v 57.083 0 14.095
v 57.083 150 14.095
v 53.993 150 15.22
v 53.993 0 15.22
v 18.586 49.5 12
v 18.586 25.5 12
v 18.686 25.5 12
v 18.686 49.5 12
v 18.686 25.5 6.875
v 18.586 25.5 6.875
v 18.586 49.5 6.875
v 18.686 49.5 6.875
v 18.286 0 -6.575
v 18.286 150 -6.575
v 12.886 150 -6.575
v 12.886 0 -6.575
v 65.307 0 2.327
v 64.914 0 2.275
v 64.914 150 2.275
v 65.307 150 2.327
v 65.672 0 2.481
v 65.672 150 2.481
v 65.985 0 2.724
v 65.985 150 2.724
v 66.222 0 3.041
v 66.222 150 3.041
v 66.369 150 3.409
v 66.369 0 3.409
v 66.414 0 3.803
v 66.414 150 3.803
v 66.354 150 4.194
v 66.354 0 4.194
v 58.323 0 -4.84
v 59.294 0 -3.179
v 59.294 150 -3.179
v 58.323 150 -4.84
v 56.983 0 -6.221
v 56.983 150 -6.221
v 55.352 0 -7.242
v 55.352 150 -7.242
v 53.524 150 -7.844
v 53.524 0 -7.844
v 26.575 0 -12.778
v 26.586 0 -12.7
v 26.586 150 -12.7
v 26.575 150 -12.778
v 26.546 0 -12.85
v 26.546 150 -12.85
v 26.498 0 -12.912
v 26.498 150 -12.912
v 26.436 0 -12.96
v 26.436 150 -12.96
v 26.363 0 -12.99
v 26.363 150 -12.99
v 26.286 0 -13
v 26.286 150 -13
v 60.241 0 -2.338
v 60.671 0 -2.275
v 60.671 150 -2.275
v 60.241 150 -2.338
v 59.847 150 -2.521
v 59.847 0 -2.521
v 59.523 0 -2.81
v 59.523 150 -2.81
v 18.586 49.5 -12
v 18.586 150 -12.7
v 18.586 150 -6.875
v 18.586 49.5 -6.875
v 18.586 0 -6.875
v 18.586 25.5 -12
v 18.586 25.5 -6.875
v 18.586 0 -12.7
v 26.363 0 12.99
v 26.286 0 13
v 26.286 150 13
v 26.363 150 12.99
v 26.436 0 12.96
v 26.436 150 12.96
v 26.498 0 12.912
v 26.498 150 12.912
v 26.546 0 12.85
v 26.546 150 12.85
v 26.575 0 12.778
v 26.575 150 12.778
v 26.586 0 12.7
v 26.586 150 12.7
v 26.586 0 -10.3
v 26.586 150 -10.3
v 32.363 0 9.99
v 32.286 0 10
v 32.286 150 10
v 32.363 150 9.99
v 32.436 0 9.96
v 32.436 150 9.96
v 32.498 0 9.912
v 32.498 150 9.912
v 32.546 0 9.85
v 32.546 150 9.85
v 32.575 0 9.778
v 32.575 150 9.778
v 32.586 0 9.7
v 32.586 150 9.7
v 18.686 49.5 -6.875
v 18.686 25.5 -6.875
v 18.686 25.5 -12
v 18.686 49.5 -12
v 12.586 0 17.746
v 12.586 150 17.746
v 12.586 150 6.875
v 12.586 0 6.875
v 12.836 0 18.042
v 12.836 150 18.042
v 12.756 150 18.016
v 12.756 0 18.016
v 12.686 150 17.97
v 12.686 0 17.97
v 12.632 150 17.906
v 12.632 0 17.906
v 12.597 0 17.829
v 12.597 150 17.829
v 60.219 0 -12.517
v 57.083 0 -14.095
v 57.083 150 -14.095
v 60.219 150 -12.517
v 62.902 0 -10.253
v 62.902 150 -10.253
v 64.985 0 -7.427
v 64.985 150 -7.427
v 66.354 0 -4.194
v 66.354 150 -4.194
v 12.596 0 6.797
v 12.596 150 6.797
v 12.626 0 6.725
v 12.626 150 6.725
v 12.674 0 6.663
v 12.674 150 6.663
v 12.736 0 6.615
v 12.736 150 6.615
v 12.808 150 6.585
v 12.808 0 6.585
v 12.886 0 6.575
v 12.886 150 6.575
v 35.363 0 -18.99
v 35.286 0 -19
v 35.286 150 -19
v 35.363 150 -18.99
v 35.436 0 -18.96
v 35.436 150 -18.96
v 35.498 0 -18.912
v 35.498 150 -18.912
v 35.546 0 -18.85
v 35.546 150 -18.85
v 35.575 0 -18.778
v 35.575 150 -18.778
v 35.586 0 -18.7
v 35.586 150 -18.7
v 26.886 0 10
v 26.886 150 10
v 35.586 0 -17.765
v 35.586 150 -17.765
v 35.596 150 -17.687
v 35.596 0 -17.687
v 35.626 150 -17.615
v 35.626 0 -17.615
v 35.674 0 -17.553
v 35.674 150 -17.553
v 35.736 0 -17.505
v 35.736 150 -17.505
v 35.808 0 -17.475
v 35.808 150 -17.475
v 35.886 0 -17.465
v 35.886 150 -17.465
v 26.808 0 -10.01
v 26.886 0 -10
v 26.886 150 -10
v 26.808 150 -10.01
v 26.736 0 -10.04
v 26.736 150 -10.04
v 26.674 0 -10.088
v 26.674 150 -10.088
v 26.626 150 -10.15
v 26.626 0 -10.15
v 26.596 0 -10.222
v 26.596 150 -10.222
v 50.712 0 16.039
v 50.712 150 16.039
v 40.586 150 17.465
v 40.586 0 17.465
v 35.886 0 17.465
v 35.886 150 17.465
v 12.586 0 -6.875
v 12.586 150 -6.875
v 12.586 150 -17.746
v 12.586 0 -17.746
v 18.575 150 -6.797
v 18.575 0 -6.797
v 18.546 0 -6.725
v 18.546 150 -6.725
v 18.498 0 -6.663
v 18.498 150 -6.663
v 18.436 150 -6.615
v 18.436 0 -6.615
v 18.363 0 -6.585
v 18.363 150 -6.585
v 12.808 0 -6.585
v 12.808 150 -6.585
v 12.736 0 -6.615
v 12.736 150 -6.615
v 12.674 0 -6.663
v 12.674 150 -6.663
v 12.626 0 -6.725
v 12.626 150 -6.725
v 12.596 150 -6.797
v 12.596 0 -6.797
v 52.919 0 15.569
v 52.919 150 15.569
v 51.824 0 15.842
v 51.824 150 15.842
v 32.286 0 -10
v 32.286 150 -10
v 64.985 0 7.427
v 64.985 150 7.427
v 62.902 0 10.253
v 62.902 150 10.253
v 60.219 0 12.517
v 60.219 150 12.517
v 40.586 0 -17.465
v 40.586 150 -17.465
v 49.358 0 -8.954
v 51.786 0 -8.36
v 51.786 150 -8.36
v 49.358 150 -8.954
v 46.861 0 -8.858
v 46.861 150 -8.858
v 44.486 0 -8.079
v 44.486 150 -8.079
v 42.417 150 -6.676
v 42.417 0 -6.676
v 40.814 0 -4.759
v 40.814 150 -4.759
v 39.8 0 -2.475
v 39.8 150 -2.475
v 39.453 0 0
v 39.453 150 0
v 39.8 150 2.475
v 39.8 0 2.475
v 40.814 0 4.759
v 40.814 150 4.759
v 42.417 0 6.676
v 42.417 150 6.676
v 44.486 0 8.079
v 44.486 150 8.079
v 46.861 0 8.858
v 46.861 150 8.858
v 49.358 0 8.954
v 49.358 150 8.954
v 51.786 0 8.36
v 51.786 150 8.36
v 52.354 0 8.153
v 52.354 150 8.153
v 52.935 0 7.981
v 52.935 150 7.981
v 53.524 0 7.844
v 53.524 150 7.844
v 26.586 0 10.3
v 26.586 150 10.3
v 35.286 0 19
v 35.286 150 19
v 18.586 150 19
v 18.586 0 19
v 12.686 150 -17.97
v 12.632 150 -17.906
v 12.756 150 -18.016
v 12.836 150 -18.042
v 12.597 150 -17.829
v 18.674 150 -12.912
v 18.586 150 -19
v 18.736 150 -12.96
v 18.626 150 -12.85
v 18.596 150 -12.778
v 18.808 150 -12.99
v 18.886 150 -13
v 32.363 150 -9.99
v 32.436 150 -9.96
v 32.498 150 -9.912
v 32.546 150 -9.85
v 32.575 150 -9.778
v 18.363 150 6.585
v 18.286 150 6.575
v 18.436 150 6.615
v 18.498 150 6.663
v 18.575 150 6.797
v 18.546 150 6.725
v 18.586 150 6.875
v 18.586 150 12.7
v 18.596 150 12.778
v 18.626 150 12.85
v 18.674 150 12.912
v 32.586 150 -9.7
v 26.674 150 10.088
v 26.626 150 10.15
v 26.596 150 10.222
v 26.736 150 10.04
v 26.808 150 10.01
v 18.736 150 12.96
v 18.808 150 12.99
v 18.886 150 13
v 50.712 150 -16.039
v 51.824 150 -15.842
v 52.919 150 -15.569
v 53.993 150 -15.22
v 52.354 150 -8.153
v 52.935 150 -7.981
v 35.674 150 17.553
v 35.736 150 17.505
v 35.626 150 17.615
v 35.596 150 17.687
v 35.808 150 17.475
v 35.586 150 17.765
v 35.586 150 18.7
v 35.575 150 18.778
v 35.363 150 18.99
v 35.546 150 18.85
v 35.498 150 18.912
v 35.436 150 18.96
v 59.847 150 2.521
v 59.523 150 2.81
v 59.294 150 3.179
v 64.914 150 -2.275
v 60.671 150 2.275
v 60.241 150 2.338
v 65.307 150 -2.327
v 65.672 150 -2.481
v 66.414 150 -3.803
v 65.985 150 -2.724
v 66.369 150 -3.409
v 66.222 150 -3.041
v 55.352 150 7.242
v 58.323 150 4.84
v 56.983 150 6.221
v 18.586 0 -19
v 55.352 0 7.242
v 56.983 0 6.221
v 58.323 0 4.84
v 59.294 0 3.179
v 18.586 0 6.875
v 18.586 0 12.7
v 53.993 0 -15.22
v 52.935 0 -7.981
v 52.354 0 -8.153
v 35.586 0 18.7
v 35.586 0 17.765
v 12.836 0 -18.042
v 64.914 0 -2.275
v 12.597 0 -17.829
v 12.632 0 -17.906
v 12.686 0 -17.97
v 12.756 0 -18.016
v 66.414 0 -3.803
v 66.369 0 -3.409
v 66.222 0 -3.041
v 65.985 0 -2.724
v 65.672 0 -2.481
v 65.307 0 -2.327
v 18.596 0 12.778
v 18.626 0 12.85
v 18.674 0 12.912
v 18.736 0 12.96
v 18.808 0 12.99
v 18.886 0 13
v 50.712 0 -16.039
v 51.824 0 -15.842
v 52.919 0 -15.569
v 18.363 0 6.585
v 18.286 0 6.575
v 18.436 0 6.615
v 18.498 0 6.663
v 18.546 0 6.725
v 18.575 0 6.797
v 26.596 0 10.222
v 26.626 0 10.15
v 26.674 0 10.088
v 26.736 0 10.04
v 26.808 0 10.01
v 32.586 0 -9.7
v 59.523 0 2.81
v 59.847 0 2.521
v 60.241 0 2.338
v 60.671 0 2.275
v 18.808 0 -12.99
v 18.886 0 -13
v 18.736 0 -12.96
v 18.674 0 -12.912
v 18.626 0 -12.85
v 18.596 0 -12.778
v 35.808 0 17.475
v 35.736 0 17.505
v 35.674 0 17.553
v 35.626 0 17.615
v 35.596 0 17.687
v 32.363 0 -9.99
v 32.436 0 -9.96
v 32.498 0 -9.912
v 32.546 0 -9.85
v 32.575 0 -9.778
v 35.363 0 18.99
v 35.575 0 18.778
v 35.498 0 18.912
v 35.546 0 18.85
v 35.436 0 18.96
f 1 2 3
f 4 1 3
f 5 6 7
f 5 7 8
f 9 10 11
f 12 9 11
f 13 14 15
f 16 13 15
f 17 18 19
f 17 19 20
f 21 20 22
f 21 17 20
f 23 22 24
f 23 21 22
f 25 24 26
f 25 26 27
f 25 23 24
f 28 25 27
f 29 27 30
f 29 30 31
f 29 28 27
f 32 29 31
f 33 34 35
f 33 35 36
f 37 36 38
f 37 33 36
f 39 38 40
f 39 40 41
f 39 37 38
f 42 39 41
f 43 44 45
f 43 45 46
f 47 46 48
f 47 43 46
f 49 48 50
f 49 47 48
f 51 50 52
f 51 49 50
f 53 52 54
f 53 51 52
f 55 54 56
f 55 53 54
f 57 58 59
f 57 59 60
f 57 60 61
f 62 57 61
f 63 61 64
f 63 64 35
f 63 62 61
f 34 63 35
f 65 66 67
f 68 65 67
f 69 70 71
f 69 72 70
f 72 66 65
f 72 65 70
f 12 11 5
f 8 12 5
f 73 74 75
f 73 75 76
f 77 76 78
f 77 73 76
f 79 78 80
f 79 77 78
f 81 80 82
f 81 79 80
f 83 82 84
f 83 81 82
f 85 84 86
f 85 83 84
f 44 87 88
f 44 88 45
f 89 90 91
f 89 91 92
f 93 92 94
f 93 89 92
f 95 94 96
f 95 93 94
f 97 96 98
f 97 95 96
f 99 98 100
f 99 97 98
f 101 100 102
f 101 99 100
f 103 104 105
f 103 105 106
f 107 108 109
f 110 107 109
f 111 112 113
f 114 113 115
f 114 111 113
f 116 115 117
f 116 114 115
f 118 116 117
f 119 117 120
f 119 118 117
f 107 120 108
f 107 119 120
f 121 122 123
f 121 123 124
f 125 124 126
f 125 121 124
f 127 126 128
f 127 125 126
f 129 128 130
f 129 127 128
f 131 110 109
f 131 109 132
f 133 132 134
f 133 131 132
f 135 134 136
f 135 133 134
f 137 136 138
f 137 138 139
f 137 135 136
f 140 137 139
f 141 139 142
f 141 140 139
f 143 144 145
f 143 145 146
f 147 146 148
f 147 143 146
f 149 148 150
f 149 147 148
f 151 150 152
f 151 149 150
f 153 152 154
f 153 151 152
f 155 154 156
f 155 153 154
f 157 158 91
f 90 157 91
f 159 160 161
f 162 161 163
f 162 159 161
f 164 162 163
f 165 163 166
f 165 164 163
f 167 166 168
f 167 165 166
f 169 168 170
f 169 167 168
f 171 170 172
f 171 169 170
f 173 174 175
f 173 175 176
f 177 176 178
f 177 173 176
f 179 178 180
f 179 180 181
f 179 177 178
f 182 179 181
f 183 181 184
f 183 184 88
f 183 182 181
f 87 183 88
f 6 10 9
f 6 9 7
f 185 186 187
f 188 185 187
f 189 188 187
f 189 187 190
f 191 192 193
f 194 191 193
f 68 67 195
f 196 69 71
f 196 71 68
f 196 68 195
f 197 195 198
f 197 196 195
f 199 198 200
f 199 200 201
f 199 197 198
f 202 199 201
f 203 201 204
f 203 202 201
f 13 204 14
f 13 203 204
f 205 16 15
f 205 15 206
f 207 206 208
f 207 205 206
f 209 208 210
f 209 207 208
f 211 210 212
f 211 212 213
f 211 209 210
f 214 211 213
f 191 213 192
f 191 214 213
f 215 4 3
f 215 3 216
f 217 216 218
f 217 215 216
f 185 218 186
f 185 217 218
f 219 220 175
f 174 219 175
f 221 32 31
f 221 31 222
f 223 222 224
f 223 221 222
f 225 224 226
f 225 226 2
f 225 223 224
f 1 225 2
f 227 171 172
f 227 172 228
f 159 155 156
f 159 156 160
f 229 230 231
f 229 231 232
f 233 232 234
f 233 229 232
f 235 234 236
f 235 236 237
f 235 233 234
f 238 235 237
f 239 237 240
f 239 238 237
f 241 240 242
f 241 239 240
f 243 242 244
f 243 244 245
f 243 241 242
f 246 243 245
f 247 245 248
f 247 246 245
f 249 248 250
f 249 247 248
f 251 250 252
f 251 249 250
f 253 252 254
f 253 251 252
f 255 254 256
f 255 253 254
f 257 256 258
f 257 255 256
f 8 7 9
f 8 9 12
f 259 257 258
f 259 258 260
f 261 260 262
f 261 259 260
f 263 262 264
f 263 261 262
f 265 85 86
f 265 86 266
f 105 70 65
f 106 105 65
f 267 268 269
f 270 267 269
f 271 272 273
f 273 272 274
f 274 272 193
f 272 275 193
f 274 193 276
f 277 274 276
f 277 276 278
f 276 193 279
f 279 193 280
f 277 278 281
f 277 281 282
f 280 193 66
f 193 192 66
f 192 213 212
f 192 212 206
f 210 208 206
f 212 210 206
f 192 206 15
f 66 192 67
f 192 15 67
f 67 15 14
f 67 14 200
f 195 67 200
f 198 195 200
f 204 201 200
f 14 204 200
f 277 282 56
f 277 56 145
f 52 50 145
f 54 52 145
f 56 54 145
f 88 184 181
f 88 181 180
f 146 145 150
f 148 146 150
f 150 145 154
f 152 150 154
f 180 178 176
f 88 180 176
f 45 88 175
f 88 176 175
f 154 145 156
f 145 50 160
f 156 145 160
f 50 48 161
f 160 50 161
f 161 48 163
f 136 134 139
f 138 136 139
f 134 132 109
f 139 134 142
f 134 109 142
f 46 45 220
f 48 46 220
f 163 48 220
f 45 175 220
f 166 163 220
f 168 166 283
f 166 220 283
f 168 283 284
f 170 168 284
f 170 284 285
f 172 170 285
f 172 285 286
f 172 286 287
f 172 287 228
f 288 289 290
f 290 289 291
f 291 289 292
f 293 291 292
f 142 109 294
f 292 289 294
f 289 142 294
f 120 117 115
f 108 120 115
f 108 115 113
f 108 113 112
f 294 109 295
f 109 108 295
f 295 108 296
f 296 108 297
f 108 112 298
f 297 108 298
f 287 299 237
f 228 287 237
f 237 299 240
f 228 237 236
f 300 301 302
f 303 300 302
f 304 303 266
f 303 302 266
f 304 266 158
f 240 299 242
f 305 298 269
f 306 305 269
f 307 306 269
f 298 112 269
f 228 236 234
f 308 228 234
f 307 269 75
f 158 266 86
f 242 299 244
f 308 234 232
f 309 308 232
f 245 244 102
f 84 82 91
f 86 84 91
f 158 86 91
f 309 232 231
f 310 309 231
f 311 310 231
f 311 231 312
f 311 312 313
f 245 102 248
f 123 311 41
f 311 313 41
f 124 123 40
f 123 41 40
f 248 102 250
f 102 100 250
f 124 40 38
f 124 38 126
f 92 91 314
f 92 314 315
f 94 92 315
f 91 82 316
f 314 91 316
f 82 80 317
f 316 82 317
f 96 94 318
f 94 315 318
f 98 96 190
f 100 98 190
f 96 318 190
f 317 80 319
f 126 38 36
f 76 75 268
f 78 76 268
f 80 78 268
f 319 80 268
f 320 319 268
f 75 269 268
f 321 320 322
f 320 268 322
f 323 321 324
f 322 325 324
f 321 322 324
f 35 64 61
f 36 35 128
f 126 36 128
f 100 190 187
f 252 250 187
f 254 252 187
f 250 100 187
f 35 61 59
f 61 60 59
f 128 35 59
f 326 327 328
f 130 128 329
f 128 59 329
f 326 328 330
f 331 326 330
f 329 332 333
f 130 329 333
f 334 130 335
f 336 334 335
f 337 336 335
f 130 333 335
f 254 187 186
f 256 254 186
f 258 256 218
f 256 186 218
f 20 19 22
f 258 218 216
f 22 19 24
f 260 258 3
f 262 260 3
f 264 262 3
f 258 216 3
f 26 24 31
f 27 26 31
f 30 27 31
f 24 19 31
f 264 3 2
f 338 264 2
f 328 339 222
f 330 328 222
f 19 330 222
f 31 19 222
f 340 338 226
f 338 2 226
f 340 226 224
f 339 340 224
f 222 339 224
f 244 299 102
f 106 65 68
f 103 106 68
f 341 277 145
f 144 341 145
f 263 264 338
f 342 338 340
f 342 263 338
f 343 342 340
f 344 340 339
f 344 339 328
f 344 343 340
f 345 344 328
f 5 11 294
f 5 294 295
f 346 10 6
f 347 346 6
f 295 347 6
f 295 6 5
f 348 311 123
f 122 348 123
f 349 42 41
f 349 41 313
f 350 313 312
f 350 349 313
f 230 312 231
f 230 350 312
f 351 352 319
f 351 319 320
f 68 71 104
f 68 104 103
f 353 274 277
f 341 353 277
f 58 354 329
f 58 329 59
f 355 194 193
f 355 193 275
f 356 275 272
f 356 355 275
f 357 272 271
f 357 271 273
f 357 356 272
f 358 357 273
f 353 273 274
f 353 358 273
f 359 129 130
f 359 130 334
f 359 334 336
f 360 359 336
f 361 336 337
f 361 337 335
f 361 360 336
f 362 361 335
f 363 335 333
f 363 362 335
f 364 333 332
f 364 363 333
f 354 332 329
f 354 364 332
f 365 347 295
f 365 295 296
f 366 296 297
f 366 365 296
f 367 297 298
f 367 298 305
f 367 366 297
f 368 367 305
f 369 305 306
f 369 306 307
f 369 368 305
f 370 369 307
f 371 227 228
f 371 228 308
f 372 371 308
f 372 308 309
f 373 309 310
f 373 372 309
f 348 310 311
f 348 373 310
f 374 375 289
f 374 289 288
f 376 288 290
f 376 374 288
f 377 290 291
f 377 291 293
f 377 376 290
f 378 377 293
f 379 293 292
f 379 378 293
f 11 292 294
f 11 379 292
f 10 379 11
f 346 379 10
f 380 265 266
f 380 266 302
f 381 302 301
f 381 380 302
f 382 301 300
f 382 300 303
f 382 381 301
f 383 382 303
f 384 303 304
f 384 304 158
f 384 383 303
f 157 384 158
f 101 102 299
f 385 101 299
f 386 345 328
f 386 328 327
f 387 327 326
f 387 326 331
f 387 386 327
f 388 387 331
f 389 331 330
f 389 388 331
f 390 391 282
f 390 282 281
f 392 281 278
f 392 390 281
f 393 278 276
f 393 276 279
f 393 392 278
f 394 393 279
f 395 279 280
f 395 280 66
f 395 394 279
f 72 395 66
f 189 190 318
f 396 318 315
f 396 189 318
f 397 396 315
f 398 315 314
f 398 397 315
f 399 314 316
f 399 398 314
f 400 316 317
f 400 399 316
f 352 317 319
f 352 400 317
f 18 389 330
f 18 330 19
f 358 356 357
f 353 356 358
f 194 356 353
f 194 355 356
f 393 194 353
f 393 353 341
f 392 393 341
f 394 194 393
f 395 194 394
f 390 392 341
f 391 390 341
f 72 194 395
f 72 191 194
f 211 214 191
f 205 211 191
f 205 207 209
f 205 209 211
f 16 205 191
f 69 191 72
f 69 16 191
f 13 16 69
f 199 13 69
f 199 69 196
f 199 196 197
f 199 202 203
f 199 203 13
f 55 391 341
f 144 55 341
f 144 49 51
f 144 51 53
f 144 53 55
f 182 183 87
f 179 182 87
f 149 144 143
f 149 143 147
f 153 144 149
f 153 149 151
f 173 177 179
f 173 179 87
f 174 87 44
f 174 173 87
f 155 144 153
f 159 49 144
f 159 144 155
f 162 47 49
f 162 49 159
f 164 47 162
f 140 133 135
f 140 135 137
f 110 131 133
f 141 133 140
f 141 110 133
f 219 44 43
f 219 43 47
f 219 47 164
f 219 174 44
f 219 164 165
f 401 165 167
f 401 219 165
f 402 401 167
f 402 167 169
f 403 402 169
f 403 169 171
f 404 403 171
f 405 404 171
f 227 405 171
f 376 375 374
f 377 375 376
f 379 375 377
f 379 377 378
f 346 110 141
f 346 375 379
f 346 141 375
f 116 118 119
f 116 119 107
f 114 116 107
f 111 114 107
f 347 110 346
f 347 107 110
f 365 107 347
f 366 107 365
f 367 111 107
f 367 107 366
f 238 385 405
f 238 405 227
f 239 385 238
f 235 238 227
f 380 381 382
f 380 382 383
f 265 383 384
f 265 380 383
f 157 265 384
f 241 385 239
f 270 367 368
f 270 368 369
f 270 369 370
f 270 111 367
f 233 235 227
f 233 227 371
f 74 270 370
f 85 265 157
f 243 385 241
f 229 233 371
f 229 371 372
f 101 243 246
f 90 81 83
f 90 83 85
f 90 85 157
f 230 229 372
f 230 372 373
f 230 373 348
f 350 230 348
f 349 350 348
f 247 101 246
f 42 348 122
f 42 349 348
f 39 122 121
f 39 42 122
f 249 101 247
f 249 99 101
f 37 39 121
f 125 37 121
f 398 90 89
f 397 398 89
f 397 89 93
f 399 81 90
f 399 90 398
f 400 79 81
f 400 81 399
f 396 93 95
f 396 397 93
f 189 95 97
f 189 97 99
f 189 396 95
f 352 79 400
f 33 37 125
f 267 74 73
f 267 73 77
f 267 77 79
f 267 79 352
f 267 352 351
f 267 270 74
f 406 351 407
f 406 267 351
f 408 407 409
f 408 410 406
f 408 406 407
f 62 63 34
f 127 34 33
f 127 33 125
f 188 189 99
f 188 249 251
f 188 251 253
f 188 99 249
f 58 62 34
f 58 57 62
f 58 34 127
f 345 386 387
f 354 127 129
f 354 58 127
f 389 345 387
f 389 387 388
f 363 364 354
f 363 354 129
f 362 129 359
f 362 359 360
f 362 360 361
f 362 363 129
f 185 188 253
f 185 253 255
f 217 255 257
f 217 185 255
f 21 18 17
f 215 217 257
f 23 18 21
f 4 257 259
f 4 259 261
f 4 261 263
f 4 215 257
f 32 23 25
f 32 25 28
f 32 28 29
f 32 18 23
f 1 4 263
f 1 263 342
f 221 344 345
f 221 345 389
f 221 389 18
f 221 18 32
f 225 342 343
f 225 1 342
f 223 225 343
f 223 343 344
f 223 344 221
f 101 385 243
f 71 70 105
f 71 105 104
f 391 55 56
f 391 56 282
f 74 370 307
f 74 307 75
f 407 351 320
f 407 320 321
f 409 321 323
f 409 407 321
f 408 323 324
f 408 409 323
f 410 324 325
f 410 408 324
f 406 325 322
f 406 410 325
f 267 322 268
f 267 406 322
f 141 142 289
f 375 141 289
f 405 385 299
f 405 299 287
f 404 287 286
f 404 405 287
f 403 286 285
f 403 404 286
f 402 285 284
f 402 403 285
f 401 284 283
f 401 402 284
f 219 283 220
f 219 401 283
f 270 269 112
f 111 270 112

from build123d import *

# Parameters (mm, degrees)
F1_DEPTH = 150
F2_W     = 24
F2_H     = 5.125
F3_DEPTH = 0.1
F4_DEPTH = 0.1


# Not quite as in the source:
# - ends of sketch curves that miss each other by under 0.0002 mm in the source are joined


with BuildPart() as f1:
    # F0 (on Front) → F1 (new body)
    with BuildSketch(Plane.XZ):
        with BuildLine():
            Line((53.992555, -15.220268), (57.083133, -14.095389))
            ThreePointArc((57.083133, -14.095389), (62.9018568836, -10.252747544), (66.3544503107, -4.1944440905))
            ThreePointArc((66.3544503107, -4.1944440905), (66.1141142416, -2.8747683688), (64.914288, -2.275))
            Line((64.914288, -2.275), (60.670593, -2.275))
            ThreePointArc((60.670593, -2.275), (59.8472095147, -2.5211899521), (59.2941043505, -3.1789471518))
            ThreePointArc((59.2941043505, -3.1789471518), (56.9827494729, -6.2209259886), (53.52425904, -7.8441451998))
            ThreePointArc((53.52425904, -7.8441451998), (52.6431740995, -8.0626756758), (51.7855370008, -8.3602070021))
            ThreePointArc((51.7855370008, -8.3602070021), (39.452831, 0), (51.7855371982, 8.3602074972))
            ThreePointArc((51.7855371982, 8.3602074972), (52.6431743712, 8.0626765952), (53.524259133, 7.844145664))
            ThreePointArc((53.524259133, 7.844145664), (56.9827494729, 6.2209259886), (59.2941043849, 3.1789471667))
            ThreePointArc((59.2941043849, 3.1789471667), (59.8472095147, 2.5211899521), (60.670593, 2.275))
            Line((60.670593, 2.275), (64.914288, 2.275))
            ThreePointArc((64.914288, 2.275), (66.1141145297, 2.8747687527), (66.3544497778, 4.1944449353))
            ThreePointArc((66.3544497778, 4.1944449353), (62.9018565554, 10.2527478944), (57.0831331177, 14.0953893235))
            Line((57.0831331177, 14.0953893235), (53.992555, 15.220268))
            ThreePointArc((53.992555, 15.220268), (52.3736165632, 15.715360306), (50.7118440801, 16.0387645685))
            Line((50.7118440801, 16.0387645685), (40.585713, 17.465))
            Line((40.585713, 17.465), (35.885713, 17.465))
            ThreePointArc((35.885713, 17.465), (35.6735809656, 17.5528679656), (35.585713, 17.765))
            Line((35.585713, 17.765), (35.585713, 18.7))
            ThreePointArc((35.585713, 18.7), (35.4978450344, 18.9121320344), (35.285713, 19))
            Line((35.285713, 19), (18.585713, 19))
            Line((18.585713, 19), (12.836393, 18.04178))
            ThreePointArc((12.836393, 18.04178), (12.656806899, 17.9397743434), (12.585713, 17.745862))
            Line((12.585713, 17.745862), (12.585713, 6.875))
            ThreePointArc((12.585713, 6.875), (12.6735809656, 6.6628679656), (12.885713, 6.575))
            Line((12.885713, 6.575), (18.285713, 6.575))
            ThreePointArc((18.285713, 6.575), (18.4978450344, 6.6628679656), (18.585713, 6.875))
            Line((18.585713, 6.875), (18.585713, 12.7))
            ThreePointArc((18.585713, 12.7), (18.6735809656, 12.9121320344), (18.885713, 13))
            Line((18.885713, 13), (26.285713, 13))
            ThreePointArc((26.285713, 13), (26.4978450344, 12.9121320344), (26.585713, 12.7))
            Line((26.585713, 12.7), (26.585713, 10.3))
            ThreePointArc((26.585713, 10.3), (26.6735809656, 10.0878679656), (26.885713, 10))
            Line((26.885713, 10), (32.285713, 10))
            ThreePointArc((32.285713, 10), (32.4978450344, 9.9121320344), (32.585713, 9.7))
            Line((32.585713, 9.7), (32.585713, -9.7))
            ThreePointArc((32.585713, -9.7), (32.4978450344, -9.9121320344), (32.285713, -10))
            Line((32.285713, -10), (26.885713, -10))
            ThreePointArc((26.885713, -10), (26.6735809656, -10.0878679656), (26.585713, -10.3))
            Line((26.585713, -10.3), (26.585713, -12.7))
            ThreePointArc((26.585713, -12.7), (26.4978450344, -12.9121320344), (26.285713, -13))
            Line((26.285713, -13), (18.885713, -13))
            ThreePointArc((18.885713, -13), (18.6735809656, -12.9121320344), (18.585713, -12.7))
            Line((18.585713, -12.7), (18.585713, -6.875))
            ThreePointArc((18.585713, -6.875), (18.4978450344, -6.6628679656), (18.285713, -6.575))
            Line((18.285713, -6.575), (12.885713, -6.575))
            ThreePointArc((12.885713, -6.575), (12.6735809656, -6.6628679656), (12.585713, -6.875))
            Line((12.585713, -6.875), (12.585713, -17.745862))
            ThreePointArc((12.585713, -17.745862), (12.656806899, -17.9397743434), (12.8363929795, -18.0417801231))
            Line((12.8363929795, -18.0417801231), (18.585713, -19))
            Line((18.585713, -19), (35.285713, -19))
            ThreePointArc((35.285713, -19), (35.4978450344, -18.9121320344), (35.585713, -18.7))
            Line((35.585713, -18.7), (35.585713, -17.765))
            ThreePointArc((35.585713, -17.765), (35.6735809656, -17.5528679656), (35.885713, -17.465))
            Line((35.885713, -17.465), (40.585713, -17.465))
            Line((40.585713, -17.465), (50.711844, -16.038764))
            ThreePointArc((50.711844, -16.038764), (52.3736165632, -15.715360306), (53.992555, -15.220268))
        make_face()
    extrude(amount=-F1_DEPTH)

    # F2 (on face) → F3 (join)
    with BuildSketch(Plane.YZ.offset(18.585713)):
        with Locations((37.5, 9.4375)):
            Rectangle(F2_W, F2_H)
    extrude(amount=F3_DEPTH)

    # F2 (on face) → F4 (join)
    with BuildSketch(Plane.YZ.offset(18.585713)):
        with Locations((37.5, -9.4375)):
            Rectangle(F2_W, F2_H)
    extrude(amount=F4_DEPTH)


solid = f1.part
